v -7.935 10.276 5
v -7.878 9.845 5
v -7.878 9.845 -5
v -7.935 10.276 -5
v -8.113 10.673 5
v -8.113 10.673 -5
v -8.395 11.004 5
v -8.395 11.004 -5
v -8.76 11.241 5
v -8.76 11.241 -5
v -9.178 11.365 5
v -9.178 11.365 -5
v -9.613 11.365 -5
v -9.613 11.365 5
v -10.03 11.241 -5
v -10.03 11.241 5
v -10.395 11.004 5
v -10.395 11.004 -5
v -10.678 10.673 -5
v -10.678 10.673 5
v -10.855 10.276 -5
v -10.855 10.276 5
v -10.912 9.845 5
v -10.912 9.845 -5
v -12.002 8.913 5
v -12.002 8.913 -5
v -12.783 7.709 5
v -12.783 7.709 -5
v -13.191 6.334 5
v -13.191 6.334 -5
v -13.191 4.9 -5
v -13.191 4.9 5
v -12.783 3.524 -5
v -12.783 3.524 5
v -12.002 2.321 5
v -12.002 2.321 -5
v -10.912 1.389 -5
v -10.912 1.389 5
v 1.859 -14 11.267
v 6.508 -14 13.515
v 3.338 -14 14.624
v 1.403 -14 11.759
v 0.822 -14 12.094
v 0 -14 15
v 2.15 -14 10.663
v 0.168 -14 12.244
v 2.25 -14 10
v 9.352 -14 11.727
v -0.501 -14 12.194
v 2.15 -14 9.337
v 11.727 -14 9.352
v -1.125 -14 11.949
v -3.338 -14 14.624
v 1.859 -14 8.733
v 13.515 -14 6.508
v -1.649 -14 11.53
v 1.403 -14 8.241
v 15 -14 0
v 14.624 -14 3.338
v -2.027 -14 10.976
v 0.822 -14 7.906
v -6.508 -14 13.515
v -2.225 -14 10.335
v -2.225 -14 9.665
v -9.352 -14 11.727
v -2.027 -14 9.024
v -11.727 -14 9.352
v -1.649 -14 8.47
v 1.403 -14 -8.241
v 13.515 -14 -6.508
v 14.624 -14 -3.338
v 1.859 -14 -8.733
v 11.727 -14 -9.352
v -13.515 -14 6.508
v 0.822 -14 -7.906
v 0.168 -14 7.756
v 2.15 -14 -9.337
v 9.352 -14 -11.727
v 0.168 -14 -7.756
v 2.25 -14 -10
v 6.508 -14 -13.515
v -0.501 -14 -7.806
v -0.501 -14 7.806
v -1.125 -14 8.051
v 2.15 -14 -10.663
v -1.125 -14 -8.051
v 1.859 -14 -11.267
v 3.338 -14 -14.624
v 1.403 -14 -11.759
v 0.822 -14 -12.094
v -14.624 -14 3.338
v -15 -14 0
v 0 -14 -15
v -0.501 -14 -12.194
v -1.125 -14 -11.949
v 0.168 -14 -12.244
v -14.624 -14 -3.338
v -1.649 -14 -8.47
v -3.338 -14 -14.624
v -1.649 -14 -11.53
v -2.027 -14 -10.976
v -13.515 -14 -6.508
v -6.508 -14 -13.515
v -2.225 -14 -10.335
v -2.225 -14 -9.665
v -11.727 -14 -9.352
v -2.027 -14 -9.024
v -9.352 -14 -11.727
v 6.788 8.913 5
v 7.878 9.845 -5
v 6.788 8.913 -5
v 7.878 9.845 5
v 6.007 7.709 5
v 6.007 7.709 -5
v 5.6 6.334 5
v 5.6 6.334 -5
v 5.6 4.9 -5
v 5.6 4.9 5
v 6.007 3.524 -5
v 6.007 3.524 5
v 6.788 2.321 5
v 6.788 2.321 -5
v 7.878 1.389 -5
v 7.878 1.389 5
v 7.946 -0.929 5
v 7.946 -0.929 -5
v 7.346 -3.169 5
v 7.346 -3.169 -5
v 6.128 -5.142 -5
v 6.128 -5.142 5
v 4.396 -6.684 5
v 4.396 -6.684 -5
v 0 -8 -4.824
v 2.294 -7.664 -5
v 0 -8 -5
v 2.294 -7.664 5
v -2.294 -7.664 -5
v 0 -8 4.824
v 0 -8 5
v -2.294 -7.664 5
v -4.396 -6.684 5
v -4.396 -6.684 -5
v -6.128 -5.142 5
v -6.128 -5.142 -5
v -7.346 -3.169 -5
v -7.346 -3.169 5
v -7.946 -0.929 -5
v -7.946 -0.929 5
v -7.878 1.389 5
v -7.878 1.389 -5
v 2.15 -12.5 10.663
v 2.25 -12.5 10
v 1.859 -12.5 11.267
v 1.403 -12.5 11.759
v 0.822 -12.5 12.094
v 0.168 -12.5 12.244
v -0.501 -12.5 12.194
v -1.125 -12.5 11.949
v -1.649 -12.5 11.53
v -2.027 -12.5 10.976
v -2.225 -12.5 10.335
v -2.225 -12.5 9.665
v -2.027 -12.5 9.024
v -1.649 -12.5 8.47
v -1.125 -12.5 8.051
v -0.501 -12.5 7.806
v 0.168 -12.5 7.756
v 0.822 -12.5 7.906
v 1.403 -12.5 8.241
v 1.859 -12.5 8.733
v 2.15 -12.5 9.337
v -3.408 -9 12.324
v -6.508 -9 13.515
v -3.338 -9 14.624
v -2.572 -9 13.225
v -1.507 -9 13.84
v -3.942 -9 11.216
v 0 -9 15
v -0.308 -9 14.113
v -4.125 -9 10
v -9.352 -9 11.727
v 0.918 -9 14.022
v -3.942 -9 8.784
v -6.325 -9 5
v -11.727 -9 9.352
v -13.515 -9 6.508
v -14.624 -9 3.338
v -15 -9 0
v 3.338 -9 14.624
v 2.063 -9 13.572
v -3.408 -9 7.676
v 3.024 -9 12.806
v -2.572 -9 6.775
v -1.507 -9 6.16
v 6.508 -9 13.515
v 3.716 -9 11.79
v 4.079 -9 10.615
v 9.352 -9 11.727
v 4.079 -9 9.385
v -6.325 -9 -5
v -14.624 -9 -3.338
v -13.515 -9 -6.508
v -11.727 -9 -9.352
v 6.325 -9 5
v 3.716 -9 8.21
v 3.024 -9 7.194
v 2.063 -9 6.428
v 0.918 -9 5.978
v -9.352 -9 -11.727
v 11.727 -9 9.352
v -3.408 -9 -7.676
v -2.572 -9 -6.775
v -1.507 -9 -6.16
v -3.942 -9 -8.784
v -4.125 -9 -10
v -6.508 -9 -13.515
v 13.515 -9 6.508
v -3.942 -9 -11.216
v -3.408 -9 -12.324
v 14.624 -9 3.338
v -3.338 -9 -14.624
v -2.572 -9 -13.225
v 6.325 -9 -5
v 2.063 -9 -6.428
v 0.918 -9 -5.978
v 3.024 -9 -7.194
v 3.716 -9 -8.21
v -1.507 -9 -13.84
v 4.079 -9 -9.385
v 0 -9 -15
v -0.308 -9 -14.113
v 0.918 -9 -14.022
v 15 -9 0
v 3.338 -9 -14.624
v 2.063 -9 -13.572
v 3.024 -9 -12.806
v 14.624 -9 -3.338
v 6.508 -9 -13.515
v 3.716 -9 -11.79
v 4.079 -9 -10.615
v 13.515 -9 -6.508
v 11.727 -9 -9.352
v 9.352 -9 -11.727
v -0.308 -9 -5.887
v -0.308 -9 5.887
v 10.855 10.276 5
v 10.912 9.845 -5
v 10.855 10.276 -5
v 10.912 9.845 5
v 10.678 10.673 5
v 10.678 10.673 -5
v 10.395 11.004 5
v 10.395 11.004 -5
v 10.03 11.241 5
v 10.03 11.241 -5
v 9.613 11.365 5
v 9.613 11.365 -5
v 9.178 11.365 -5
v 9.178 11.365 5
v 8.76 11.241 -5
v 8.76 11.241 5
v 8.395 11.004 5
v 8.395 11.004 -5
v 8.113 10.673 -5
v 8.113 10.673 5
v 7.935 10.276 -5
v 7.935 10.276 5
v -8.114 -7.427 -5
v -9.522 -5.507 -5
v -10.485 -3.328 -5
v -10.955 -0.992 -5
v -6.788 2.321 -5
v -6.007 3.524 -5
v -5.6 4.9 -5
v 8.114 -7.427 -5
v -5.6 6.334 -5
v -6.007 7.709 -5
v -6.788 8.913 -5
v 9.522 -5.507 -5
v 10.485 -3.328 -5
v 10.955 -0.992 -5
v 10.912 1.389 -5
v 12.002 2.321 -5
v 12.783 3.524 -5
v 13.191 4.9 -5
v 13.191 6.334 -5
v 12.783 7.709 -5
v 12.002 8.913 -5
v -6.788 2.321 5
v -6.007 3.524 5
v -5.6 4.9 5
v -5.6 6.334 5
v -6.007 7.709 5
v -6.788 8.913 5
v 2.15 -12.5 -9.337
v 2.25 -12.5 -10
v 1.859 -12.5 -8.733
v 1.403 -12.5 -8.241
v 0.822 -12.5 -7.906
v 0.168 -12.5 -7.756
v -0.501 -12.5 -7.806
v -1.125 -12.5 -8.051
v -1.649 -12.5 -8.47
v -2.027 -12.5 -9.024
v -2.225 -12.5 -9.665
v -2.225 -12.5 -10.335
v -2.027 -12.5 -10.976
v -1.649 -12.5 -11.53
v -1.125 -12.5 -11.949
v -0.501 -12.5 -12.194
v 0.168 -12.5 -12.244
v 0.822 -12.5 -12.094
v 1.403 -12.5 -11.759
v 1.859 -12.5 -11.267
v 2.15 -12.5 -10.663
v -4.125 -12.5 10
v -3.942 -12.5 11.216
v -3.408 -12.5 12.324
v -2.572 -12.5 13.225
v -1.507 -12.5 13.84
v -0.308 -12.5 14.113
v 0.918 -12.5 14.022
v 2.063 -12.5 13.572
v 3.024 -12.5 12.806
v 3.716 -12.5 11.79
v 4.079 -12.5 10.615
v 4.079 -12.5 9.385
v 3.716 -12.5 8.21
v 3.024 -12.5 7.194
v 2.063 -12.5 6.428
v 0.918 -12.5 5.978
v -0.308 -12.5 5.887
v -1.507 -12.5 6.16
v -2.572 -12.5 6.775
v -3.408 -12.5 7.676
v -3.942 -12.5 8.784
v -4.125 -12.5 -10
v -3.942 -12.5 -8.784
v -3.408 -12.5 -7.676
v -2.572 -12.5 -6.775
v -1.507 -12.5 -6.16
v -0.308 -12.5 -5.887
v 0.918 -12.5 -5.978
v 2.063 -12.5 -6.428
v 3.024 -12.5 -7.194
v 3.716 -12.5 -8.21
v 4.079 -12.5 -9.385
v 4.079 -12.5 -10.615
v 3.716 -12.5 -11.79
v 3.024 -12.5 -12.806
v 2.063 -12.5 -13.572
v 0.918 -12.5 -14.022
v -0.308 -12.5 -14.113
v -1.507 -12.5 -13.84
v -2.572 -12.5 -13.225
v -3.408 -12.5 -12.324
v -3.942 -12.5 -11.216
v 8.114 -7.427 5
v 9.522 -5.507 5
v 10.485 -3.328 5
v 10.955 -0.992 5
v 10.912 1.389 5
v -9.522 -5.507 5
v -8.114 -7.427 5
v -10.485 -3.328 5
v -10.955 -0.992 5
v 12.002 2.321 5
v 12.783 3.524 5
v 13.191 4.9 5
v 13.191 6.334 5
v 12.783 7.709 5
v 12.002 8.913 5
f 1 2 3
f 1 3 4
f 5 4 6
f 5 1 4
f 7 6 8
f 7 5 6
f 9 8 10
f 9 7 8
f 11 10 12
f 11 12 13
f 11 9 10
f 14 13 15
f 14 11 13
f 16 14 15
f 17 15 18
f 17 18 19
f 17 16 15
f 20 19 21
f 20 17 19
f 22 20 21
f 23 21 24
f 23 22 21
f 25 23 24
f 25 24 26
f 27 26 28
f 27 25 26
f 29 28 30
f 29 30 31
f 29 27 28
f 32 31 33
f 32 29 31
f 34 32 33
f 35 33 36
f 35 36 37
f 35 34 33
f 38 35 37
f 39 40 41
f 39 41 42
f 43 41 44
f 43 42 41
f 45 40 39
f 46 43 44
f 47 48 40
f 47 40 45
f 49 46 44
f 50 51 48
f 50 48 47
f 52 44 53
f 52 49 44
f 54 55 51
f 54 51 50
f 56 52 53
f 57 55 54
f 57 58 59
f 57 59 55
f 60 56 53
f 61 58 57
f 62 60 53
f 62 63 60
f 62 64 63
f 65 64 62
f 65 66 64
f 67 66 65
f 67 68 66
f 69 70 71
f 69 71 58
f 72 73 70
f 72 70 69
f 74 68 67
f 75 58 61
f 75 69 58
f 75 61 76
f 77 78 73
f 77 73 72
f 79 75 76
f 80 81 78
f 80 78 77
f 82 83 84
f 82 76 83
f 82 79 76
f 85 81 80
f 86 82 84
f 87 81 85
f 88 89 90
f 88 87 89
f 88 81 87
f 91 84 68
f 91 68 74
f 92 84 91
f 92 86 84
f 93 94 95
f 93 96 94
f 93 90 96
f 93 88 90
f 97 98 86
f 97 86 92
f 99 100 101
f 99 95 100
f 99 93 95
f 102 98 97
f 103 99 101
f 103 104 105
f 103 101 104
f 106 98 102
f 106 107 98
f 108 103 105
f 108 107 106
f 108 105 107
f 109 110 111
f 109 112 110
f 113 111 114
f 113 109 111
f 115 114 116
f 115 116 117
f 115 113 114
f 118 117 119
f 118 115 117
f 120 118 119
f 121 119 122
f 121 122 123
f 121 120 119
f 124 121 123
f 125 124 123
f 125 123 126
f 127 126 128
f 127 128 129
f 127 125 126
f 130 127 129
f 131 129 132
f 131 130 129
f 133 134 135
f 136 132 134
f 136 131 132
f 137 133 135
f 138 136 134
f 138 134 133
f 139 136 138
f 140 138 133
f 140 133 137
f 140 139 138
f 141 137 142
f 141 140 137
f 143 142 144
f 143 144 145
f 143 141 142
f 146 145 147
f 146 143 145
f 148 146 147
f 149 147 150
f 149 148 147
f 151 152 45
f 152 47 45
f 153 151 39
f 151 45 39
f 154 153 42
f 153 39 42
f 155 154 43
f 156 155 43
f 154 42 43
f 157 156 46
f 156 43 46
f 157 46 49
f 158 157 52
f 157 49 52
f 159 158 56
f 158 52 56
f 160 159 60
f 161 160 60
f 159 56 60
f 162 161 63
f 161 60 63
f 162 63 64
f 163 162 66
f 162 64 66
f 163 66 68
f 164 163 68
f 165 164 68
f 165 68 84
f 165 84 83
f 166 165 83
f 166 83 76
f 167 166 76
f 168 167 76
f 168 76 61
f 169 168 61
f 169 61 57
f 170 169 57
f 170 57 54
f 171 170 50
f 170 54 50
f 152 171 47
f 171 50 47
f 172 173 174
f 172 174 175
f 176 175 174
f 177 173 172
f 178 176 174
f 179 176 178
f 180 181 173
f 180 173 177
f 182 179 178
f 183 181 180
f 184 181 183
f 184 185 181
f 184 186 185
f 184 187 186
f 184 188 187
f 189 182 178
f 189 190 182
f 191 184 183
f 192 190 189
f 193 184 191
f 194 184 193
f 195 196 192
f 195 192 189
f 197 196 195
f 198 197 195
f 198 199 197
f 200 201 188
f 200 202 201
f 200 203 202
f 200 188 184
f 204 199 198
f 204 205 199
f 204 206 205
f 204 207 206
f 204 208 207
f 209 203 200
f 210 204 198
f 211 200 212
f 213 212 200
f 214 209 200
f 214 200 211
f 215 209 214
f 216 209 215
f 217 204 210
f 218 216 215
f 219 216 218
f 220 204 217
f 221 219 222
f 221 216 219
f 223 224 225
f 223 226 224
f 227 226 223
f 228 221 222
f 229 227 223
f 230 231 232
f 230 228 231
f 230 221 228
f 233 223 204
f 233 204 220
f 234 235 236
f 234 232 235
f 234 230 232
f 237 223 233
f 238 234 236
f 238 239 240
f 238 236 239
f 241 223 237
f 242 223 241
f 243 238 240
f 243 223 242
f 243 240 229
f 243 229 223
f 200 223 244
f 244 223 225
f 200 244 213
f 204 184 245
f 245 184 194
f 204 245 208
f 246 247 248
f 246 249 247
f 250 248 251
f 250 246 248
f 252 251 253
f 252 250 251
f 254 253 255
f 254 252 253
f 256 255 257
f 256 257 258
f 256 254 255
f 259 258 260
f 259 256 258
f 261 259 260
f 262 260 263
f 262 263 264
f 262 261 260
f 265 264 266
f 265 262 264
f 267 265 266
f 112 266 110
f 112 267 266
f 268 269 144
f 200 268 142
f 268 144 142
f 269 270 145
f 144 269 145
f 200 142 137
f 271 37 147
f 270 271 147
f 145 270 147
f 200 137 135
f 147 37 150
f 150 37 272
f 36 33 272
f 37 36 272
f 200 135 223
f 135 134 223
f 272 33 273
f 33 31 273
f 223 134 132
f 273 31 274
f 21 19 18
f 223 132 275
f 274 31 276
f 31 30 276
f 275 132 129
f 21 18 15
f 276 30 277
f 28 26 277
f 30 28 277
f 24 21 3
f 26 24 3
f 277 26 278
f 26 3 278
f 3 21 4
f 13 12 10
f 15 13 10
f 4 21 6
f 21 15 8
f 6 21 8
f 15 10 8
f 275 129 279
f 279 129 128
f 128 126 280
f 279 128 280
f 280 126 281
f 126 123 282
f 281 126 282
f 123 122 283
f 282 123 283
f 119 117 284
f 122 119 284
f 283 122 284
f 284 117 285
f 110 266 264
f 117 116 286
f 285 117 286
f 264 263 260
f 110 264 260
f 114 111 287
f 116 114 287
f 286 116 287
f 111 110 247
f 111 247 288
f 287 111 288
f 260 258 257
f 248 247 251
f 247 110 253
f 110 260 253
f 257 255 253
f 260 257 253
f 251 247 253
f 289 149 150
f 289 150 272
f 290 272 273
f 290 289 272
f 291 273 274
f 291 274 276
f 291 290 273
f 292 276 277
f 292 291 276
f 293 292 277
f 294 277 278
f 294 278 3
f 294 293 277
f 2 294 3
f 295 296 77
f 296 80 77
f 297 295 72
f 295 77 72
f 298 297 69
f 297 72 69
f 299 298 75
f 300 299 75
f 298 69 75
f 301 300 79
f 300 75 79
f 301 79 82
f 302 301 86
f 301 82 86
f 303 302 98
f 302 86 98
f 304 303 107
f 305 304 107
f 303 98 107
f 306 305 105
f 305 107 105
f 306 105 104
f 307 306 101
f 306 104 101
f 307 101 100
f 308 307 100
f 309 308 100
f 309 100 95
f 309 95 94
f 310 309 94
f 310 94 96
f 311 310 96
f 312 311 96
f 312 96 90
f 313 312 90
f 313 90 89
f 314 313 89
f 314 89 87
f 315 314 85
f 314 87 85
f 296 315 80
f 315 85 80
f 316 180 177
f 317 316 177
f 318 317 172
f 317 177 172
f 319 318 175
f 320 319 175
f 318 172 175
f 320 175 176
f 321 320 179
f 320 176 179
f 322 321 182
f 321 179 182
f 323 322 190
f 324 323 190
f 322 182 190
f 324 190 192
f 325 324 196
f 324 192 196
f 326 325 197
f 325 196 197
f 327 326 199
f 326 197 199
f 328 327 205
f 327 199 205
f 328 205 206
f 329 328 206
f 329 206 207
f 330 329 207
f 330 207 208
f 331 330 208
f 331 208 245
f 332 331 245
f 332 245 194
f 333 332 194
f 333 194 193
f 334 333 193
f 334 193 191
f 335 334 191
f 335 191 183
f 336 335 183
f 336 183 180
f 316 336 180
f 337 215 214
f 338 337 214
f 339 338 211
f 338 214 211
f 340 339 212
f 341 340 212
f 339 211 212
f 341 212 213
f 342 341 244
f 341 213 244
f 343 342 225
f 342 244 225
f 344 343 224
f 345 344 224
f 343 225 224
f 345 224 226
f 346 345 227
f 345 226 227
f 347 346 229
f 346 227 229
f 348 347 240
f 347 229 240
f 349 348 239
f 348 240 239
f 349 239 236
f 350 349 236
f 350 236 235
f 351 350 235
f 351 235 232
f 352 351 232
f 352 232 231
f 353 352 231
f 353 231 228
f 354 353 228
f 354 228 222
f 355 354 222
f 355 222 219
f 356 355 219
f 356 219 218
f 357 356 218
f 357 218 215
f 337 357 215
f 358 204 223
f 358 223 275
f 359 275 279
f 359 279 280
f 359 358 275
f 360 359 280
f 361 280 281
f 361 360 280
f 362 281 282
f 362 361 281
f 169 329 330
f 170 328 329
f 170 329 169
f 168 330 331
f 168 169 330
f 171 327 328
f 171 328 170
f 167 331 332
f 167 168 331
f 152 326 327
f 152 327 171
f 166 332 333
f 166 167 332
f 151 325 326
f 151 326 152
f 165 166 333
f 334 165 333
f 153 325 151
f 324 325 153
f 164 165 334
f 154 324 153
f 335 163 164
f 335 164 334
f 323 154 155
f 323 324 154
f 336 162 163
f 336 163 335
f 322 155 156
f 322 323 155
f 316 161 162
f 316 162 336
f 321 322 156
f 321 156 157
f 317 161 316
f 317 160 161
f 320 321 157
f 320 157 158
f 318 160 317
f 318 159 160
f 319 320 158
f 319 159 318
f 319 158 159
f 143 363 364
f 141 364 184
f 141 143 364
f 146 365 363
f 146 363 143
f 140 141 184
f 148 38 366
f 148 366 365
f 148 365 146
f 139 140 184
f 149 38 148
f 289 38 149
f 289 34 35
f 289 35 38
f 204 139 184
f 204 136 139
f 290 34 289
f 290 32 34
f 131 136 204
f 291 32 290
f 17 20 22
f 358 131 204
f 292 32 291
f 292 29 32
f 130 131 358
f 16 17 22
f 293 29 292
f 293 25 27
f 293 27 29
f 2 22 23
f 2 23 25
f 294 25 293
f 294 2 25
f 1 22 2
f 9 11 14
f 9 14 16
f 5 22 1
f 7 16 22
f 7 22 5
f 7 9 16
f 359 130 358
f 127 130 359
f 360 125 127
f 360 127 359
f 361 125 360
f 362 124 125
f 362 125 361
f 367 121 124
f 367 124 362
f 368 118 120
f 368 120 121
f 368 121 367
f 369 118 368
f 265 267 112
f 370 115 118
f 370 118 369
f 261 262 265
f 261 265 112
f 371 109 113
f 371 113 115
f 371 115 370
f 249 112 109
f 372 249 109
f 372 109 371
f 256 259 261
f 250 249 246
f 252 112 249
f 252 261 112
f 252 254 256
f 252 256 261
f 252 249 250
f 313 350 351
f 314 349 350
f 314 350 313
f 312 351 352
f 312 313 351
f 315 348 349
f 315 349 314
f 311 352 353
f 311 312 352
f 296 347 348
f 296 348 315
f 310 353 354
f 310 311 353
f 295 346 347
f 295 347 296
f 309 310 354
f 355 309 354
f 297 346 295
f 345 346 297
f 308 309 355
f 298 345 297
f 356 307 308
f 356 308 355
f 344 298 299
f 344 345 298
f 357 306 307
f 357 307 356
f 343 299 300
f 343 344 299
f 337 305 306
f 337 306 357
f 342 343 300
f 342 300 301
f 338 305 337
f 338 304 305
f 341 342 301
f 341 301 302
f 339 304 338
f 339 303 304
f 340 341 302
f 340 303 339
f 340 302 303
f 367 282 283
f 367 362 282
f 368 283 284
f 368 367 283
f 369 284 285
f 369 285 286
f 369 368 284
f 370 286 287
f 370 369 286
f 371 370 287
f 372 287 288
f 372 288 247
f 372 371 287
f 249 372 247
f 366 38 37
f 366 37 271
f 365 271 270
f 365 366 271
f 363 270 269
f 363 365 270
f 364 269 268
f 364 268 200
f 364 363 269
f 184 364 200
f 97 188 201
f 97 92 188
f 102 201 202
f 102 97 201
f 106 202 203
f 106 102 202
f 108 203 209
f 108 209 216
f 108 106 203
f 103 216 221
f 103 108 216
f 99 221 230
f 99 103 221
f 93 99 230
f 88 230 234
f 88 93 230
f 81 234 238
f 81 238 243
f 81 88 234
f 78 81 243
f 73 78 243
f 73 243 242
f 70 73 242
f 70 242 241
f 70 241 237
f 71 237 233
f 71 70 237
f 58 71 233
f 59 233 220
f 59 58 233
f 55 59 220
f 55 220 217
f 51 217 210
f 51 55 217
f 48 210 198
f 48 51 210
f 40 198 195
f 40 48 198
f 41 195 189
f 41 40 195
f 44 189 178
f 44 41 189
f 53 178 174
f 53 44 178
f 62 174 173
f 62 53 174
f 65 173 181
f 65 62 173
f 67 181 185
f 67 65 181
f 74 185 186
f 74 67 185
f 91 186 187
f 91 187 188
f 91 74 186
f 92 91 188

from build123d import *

# Parameters (mm, degrees)
F1_DEPTH       = 5
F5_D           = 4.5
F5_CBORE_D     = 8.25
F5_CBORE_DEPTH = 3.5


with BuildPart() as f1:
    # F0 (on Top) → F1 (new body, symmetric)
    with BuildSketch(Plane.XY):
        with BuildLine():
            ThreePointArc((7.8784620241, 9.8445622258), (5.5480407874, 5.6168738236), (7.8784620241, 1.3891854213))
            ThreePointArc((7.8784620241, 1.3891854213), (6.128355545, -5.1423008775), (0, -8))
            Line((0, -8), (0, -11))
            ThreePointArc((0, -11), (8.2547271195, -7.2704525432), (10.9119275962, 1.3891854213))
            ThreePointArc((10.9119275962, 1.3891854213), (13.2423488329, 5.6168738236), (10.9119275962, 9.8445622258))
            ThreePointArc((10.9119275962, 9.8445622258), (9.3951948102, 11.3803842849), (7.8784620241, 9.8445622258))
        make_face()
        with BuildLine():
            Line((-4.8236730193, -8), (0, -8))
            ThreePointArc((0, -8), (-6.128355545, -5.1423008775), (-7.8784620241, 1.3891854213))
            ThreePointArc((-7.8784620241, 1.3891854213), (-5.5480407874, 5.6168738236), (-7.8784620241, 9.8445622258))
            ThreePointArc((-7.8784620241, 9.8445622258), (-9.3951948102, 11.3803842849), (-10.9119275962, 9.8445622258))
            ThreePointArc((-10.9119275962, 9.8445622258), (-13.2423488329, 5.6168738236), (-10.9119275962, 1.3891854213))
            ThreePointArc((-10.9119275962, 1.3891854213), (-10.0626974149, -4.4432106339), (-6.3245553203, -9))
            Line((-6.3245553203, -9), (-5, -9))
            Line((-5, -9), (-4.8236730193, -8))
        make_face()
        with BuildLine():
            Line((0, -11), (0, -8))
            Line((0, -8), (-4.8236730193, -8))
            Line((-4.8236730193, -8), (-5, -9))
            Line((-5, -9), (-6.3245553203, -9))
            ThreePointArc((-6.3245553203, -9), (-3.3166247904, -10.4880884817), (0, -11))
        make_face()
    extrude(amount=F1_DEPTH, both=True)


with BuildPart() as f2:
    # F0 (on Top) → F2 (revolve)
    with BuildSketch(Plane.XY):
        with BuildLine():
            Line((0, -11), (0, -8))
            Line((0, -8), (-4.8236730193, -8))
            Line((-4.8236730193, -8), (-5, -9))
            Line((-5, -9), (-6.3245553203, -9))
            ThreePointArc((-6.3245553203, -9), (-3.3166247904, -10.4880884817), (0, -11))
        make_face()
        with BuildLine():
            Line((0, -14), (0, -11))
            ThreePointArc((0, -11), (-3.3166247904, -10.4880884817), (-6.3245553203, -9))
            Line((-6.3245553203, -9), (-15, -9))
            Line((-15, -9), (-15, -14))
            Line((-15, -14), (0, -14))
        make_face()
    revolve(axis=Axis((0, -31.6533013247, 0), (0, -1, 0)))


with BuildPart() as f1_1:
    add(f1.part)

    # F3: union F2
    add(f2.part)

    # F5 (through all)
    with Locations(Plane(origin=(0, -9, 0), x_dir=(-1, 0, 0), z_dir=(0, 1, 0))):
        with Locations((0, -10), (0, 10)):
            CounterBoreHole(F5_D / 2, F5_CBORE_D / 2, F5_CBORE_DEPTH)


solid = f1_1.part
